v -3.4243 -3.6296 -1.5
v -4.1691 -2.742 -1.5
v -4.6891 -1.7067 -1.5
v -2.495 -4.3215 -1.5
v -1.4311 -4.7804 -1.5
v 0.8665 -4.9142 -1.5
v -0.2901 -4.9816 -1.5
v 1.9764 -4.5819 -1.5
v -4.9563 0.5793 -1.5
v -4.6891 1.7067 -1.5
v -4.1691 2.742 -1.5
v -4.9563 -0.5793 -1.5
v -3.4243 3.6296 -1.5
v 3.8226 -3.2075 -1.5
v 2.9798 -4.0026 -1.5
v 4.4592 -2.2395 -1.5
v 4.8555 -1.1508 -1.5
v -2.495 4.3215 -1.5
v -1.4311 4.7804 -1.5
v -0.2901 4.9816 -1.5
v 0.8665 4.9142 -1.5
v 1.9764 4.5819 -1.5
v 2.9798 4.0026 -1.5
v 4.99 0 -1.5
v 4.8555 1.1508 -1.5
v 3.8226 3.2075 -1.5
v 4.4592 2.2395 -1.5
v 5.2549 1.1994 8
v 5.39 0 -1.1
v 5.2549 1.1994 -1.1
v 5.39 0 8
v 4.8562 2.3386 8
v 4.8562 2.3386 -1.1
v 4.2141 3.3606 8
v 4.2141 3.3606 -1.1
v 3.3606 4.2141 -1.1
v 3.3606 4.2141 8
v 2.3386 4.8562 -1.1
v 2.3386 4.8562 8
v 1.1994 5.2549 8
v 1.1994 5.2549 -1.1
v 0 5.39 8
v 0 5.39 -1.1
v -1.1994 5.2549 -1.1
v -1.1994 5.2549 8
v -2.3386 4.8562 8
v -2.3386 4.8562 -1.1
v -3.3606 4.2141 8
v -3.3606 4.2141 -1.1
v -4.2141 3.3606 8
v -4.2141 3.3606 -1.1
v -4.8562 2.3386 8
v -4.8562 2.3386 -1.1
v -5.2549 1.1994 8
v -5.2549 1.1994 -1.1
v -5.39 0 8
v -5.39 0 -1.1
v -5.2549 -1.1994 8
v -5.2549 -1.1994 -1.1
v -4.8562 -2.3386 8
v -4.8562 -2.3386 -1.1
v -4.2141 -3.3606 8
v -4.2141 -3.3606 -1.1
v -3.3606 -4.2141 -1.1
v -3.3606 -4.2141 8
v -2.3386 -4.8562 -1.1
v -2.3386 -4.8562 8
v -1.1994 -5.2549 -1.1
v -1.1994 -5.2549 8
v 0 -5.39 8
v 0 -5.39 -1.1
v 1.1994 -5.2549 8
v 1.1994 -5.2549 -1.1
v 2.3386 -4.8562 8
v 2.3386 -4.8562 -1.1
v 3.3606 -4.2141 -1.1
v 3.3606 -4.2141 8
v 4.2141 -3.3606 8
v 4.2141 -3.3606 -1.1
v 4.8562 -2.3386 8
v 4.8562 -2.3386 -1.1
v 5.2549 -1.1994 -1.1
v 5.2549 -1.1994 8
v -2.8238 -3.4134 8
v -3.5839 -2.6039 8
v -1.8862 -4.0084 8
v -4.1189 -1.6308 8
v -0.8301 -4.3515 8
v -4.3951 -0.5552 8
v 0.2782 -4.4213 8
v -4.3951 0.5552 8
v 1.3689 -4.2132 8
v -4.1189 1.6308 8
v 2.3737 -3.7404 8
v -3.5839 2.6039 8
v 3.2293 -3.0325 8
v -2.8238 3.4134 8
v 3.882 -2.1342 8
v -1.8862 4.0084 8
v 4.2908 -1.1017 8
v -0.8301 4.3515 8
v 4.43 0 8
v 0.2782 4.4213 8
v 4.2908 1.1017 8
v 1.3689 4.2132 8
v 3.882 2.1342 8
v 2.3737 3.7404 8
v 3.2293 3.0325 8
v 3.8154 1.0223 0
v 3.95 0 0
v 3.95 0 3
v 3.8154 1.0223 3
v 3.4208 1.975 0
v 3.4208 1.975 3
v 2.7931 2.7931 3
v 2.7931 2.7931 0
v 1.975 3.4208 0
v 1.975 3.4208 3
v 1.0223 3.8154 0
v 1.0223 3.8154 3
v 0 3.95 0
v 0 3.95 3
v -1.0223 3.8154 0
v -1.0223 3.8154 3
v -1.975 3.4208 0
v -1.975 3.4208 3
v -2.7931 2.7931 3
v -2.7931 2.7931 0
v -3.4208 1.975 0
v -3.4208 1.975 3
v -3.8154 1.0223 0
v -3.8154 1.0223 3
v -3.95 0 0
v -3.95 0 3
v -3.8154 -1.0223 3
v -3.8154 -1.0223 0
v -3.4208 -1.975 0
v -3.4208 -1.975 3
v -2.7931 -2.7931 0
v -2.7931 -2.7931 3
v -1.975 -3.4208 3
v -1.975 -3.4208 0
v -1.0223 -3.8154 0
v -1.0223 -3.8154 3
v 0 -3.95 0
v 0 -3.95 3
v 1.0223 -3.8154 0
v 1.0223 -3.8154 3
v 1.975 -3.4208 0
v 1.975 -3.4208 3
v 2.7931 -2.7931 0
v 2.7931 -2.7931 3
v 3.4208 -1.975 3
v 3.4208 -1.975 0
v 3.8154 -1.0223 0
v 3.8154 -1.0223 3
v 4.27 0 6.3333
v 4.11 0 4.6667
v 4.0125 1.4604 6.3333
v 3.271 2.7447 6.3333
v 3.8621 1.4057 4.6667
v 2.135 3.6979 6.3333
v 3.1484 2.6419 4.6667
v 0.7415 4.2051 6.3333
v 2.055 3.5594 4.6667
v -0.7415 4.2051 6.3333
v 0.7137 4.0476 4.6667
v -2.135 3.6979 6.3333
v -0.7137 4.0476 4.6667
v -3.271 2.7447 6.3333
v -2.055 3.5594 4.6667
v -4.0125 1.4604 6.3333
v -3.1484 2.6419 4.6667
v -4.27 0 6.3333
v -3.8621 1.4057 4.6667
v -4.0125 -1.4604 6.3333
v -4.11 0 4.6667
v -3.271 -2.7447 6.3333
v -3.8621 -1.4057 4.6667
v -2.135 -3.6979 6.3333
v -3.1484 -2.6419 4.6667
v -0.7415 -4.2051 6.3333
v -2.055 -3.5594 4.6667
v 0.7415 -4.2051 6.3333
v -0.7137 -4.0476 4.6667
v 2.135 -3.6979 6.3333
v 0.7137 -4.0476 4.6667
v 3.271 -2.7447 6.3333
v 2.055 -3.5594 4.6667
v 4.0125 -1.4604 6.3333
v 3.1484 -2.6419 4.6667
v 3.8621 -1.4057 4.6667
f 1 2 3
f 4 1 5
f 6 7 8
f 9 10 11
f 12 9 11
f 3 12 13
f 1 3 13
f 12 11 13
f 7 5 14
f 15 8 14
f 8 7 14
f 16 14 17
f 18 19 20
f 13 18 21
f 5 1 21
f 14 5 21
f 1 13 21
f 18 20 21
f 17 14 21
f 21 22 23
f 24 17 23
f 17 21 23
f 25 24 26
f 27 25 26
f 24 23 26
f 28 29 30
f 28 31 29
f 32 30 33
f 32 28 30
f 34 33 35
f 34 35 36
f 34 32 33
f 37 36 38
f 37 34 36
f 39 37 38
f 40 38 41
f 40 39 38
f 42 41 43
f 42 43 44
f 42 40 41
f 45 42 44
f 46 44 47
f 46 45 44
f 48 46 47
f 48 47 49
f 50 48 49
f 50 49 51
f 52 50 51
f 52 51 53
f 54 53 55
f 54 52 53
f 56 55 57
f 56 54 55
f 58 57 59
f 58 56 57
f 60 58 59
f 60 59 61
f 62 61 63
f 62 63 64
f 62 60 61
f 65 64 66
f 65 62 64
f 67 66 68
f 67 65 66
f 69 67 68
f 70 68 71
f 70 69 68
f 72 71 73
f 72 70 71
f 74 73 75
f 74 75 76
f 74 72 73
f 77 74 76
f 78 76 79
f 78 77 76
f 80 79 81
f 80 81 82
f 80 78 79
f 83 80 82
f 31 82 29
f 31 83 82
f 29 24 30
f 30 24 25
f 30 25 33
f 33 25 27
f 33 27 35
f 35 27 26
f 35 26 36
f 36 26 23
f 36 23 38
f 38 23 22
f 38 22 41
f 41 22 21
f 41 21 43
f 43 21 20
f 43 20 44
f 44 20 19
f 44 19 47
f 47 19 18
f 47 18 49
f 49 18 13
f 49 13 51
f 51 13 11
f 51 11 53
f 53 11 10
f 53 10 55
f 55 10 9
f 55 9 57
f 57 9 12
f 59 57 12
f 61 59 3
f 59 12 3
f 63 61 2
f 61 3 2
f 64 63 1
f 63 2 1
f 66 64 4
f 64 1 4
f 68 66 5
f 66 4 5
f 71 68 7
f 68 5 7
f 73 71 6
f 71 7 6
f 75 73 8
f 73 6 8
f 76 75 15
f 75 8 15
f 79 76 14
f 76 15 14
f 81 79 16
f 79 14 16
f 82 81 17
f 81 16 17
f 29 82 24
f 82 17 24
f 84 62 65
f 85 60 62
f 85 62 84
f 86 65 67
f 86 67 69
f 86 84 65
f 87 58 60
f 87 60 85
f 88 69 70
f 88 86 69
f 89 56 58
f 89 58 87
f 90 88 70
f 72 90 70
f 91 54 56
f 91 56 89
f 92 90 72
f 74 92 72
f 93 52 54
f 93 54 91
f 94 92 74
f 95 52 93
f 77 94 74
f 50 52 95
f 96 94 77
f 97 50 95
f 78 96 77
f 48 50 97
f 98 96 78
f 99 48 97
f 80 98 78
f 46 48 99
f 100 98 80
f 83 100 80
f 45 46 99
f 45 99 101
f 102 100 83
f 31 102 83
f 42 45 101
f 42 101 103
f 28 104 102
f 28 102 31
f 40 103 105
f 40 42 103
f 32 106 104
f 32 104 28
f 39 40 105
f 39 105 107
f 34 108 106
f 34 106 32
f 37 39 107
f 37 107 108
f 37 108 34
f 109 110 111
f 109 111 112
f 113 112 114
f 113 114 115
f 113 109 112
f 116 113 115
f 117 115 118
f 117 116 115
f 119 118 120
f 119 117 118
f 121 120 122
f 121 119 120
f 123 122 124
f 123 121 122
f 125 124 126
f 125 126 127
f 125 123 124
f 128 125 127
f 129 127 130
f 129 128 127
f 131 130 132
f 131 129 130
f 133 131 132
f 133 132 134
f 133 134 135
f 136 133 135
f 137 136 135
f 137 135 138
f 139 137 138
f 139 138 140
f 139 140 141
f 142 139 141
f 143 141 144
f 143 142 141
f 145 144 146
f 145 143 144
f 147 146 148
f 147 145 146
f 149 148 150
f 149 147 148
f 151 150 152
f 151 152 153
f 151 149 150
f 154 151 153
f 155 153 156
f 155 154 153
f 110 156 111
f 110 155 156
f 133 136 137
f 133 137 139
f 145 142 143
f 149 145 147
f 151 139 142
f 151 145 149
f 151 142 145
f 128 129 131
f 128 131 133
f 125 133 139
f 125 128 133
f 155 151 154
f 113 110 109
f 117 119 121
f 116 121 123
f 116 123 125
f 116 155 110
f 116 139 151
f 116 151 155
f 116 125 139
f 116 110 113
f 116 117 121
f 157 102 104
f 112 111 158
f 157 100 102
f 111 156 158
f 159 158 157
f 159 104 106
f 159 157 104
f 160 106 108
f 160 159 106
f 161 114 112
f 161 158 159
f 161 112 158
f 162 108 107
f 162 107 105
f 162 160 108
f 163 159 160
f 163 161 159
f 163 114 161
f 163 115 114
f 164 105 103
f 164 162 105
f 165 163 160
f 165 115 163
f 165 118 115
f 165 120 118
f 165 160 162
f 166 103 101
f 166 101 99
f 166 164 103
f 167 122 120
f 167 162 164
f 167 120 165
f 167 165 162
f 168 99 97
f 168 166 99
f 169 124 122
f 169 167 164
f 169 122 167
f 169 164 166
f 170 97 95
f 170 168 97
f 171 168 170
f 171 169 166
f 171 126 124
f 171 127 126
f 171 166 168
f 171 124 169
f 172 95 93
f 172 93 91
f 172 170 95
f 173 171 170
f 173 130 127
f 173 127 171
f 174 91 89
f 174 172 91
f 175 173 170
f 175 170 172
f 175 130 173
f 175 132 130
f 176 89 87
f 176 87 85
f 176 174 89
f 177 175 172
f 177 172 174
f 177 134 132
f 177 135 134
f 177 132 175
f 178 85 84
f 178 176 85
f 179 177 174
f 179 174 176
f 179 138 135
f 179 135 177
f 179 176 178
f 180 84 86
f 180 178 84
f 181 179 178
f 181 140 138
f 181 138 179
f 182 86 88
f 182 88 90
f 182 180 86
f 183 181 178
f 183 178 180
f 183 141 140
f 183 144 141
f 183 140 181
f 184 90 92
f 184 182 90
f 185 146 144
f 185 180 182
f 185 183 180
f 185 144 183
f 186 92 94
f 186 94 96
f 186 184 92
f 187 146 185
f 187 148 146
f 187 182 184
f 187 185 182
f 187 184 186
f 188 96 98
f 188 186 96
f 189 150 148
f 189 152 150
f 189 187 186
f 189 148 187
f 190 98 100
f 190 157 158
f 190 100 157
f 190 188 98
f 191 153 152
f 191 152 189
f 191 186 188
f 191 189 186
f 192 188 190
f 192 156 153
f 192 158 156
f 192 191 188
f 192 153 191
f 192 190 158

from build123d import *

# Parameters (mm, degrees)
F0_R     = 5.39
F0_R_2   = 3.95
F1_DEPTH = 1.5
F2_DEPTH = 8
F3_SIZE2 = 5
F3_SIZE  = 0.48
F4_SIZE  = 0.4


with BuildPart() as f1:
    # F0 (on Top) → F1 (new body)
    with BuildSketch(Plane.XY):
        Circle(F0_R)
        Circle(F0_R_2, mode=Mode.SUBTRACT)
        Circle(F0_R_2)
    extrude(amount=-F1_DEPTH)

    # F0 (on Top) → F2 (join)
    with BuildSketch(Plane.XY):
        Circle(F0_R)
        Circle(F0_R_2, mode=Mode.SUBTRACT)
    extrude(amount=F2_DEPTH)

    # F3
    f3_edges = [f1.edges().sort_by_distance(p)[0] for p in [
        (-3.95, 0, 8),
    ]]
    chamfer(f3_edges, length=F3_SIZE, length2=F3_SIZE2)

    # F4
    f4_edges = [f1.edges().sort_by_distance(p)[0] for p in [
        (-5.39, 0, -1.5),
    ]]
    chamfer(f4_edges, length=F4_SIZE)


solid = f1.part
